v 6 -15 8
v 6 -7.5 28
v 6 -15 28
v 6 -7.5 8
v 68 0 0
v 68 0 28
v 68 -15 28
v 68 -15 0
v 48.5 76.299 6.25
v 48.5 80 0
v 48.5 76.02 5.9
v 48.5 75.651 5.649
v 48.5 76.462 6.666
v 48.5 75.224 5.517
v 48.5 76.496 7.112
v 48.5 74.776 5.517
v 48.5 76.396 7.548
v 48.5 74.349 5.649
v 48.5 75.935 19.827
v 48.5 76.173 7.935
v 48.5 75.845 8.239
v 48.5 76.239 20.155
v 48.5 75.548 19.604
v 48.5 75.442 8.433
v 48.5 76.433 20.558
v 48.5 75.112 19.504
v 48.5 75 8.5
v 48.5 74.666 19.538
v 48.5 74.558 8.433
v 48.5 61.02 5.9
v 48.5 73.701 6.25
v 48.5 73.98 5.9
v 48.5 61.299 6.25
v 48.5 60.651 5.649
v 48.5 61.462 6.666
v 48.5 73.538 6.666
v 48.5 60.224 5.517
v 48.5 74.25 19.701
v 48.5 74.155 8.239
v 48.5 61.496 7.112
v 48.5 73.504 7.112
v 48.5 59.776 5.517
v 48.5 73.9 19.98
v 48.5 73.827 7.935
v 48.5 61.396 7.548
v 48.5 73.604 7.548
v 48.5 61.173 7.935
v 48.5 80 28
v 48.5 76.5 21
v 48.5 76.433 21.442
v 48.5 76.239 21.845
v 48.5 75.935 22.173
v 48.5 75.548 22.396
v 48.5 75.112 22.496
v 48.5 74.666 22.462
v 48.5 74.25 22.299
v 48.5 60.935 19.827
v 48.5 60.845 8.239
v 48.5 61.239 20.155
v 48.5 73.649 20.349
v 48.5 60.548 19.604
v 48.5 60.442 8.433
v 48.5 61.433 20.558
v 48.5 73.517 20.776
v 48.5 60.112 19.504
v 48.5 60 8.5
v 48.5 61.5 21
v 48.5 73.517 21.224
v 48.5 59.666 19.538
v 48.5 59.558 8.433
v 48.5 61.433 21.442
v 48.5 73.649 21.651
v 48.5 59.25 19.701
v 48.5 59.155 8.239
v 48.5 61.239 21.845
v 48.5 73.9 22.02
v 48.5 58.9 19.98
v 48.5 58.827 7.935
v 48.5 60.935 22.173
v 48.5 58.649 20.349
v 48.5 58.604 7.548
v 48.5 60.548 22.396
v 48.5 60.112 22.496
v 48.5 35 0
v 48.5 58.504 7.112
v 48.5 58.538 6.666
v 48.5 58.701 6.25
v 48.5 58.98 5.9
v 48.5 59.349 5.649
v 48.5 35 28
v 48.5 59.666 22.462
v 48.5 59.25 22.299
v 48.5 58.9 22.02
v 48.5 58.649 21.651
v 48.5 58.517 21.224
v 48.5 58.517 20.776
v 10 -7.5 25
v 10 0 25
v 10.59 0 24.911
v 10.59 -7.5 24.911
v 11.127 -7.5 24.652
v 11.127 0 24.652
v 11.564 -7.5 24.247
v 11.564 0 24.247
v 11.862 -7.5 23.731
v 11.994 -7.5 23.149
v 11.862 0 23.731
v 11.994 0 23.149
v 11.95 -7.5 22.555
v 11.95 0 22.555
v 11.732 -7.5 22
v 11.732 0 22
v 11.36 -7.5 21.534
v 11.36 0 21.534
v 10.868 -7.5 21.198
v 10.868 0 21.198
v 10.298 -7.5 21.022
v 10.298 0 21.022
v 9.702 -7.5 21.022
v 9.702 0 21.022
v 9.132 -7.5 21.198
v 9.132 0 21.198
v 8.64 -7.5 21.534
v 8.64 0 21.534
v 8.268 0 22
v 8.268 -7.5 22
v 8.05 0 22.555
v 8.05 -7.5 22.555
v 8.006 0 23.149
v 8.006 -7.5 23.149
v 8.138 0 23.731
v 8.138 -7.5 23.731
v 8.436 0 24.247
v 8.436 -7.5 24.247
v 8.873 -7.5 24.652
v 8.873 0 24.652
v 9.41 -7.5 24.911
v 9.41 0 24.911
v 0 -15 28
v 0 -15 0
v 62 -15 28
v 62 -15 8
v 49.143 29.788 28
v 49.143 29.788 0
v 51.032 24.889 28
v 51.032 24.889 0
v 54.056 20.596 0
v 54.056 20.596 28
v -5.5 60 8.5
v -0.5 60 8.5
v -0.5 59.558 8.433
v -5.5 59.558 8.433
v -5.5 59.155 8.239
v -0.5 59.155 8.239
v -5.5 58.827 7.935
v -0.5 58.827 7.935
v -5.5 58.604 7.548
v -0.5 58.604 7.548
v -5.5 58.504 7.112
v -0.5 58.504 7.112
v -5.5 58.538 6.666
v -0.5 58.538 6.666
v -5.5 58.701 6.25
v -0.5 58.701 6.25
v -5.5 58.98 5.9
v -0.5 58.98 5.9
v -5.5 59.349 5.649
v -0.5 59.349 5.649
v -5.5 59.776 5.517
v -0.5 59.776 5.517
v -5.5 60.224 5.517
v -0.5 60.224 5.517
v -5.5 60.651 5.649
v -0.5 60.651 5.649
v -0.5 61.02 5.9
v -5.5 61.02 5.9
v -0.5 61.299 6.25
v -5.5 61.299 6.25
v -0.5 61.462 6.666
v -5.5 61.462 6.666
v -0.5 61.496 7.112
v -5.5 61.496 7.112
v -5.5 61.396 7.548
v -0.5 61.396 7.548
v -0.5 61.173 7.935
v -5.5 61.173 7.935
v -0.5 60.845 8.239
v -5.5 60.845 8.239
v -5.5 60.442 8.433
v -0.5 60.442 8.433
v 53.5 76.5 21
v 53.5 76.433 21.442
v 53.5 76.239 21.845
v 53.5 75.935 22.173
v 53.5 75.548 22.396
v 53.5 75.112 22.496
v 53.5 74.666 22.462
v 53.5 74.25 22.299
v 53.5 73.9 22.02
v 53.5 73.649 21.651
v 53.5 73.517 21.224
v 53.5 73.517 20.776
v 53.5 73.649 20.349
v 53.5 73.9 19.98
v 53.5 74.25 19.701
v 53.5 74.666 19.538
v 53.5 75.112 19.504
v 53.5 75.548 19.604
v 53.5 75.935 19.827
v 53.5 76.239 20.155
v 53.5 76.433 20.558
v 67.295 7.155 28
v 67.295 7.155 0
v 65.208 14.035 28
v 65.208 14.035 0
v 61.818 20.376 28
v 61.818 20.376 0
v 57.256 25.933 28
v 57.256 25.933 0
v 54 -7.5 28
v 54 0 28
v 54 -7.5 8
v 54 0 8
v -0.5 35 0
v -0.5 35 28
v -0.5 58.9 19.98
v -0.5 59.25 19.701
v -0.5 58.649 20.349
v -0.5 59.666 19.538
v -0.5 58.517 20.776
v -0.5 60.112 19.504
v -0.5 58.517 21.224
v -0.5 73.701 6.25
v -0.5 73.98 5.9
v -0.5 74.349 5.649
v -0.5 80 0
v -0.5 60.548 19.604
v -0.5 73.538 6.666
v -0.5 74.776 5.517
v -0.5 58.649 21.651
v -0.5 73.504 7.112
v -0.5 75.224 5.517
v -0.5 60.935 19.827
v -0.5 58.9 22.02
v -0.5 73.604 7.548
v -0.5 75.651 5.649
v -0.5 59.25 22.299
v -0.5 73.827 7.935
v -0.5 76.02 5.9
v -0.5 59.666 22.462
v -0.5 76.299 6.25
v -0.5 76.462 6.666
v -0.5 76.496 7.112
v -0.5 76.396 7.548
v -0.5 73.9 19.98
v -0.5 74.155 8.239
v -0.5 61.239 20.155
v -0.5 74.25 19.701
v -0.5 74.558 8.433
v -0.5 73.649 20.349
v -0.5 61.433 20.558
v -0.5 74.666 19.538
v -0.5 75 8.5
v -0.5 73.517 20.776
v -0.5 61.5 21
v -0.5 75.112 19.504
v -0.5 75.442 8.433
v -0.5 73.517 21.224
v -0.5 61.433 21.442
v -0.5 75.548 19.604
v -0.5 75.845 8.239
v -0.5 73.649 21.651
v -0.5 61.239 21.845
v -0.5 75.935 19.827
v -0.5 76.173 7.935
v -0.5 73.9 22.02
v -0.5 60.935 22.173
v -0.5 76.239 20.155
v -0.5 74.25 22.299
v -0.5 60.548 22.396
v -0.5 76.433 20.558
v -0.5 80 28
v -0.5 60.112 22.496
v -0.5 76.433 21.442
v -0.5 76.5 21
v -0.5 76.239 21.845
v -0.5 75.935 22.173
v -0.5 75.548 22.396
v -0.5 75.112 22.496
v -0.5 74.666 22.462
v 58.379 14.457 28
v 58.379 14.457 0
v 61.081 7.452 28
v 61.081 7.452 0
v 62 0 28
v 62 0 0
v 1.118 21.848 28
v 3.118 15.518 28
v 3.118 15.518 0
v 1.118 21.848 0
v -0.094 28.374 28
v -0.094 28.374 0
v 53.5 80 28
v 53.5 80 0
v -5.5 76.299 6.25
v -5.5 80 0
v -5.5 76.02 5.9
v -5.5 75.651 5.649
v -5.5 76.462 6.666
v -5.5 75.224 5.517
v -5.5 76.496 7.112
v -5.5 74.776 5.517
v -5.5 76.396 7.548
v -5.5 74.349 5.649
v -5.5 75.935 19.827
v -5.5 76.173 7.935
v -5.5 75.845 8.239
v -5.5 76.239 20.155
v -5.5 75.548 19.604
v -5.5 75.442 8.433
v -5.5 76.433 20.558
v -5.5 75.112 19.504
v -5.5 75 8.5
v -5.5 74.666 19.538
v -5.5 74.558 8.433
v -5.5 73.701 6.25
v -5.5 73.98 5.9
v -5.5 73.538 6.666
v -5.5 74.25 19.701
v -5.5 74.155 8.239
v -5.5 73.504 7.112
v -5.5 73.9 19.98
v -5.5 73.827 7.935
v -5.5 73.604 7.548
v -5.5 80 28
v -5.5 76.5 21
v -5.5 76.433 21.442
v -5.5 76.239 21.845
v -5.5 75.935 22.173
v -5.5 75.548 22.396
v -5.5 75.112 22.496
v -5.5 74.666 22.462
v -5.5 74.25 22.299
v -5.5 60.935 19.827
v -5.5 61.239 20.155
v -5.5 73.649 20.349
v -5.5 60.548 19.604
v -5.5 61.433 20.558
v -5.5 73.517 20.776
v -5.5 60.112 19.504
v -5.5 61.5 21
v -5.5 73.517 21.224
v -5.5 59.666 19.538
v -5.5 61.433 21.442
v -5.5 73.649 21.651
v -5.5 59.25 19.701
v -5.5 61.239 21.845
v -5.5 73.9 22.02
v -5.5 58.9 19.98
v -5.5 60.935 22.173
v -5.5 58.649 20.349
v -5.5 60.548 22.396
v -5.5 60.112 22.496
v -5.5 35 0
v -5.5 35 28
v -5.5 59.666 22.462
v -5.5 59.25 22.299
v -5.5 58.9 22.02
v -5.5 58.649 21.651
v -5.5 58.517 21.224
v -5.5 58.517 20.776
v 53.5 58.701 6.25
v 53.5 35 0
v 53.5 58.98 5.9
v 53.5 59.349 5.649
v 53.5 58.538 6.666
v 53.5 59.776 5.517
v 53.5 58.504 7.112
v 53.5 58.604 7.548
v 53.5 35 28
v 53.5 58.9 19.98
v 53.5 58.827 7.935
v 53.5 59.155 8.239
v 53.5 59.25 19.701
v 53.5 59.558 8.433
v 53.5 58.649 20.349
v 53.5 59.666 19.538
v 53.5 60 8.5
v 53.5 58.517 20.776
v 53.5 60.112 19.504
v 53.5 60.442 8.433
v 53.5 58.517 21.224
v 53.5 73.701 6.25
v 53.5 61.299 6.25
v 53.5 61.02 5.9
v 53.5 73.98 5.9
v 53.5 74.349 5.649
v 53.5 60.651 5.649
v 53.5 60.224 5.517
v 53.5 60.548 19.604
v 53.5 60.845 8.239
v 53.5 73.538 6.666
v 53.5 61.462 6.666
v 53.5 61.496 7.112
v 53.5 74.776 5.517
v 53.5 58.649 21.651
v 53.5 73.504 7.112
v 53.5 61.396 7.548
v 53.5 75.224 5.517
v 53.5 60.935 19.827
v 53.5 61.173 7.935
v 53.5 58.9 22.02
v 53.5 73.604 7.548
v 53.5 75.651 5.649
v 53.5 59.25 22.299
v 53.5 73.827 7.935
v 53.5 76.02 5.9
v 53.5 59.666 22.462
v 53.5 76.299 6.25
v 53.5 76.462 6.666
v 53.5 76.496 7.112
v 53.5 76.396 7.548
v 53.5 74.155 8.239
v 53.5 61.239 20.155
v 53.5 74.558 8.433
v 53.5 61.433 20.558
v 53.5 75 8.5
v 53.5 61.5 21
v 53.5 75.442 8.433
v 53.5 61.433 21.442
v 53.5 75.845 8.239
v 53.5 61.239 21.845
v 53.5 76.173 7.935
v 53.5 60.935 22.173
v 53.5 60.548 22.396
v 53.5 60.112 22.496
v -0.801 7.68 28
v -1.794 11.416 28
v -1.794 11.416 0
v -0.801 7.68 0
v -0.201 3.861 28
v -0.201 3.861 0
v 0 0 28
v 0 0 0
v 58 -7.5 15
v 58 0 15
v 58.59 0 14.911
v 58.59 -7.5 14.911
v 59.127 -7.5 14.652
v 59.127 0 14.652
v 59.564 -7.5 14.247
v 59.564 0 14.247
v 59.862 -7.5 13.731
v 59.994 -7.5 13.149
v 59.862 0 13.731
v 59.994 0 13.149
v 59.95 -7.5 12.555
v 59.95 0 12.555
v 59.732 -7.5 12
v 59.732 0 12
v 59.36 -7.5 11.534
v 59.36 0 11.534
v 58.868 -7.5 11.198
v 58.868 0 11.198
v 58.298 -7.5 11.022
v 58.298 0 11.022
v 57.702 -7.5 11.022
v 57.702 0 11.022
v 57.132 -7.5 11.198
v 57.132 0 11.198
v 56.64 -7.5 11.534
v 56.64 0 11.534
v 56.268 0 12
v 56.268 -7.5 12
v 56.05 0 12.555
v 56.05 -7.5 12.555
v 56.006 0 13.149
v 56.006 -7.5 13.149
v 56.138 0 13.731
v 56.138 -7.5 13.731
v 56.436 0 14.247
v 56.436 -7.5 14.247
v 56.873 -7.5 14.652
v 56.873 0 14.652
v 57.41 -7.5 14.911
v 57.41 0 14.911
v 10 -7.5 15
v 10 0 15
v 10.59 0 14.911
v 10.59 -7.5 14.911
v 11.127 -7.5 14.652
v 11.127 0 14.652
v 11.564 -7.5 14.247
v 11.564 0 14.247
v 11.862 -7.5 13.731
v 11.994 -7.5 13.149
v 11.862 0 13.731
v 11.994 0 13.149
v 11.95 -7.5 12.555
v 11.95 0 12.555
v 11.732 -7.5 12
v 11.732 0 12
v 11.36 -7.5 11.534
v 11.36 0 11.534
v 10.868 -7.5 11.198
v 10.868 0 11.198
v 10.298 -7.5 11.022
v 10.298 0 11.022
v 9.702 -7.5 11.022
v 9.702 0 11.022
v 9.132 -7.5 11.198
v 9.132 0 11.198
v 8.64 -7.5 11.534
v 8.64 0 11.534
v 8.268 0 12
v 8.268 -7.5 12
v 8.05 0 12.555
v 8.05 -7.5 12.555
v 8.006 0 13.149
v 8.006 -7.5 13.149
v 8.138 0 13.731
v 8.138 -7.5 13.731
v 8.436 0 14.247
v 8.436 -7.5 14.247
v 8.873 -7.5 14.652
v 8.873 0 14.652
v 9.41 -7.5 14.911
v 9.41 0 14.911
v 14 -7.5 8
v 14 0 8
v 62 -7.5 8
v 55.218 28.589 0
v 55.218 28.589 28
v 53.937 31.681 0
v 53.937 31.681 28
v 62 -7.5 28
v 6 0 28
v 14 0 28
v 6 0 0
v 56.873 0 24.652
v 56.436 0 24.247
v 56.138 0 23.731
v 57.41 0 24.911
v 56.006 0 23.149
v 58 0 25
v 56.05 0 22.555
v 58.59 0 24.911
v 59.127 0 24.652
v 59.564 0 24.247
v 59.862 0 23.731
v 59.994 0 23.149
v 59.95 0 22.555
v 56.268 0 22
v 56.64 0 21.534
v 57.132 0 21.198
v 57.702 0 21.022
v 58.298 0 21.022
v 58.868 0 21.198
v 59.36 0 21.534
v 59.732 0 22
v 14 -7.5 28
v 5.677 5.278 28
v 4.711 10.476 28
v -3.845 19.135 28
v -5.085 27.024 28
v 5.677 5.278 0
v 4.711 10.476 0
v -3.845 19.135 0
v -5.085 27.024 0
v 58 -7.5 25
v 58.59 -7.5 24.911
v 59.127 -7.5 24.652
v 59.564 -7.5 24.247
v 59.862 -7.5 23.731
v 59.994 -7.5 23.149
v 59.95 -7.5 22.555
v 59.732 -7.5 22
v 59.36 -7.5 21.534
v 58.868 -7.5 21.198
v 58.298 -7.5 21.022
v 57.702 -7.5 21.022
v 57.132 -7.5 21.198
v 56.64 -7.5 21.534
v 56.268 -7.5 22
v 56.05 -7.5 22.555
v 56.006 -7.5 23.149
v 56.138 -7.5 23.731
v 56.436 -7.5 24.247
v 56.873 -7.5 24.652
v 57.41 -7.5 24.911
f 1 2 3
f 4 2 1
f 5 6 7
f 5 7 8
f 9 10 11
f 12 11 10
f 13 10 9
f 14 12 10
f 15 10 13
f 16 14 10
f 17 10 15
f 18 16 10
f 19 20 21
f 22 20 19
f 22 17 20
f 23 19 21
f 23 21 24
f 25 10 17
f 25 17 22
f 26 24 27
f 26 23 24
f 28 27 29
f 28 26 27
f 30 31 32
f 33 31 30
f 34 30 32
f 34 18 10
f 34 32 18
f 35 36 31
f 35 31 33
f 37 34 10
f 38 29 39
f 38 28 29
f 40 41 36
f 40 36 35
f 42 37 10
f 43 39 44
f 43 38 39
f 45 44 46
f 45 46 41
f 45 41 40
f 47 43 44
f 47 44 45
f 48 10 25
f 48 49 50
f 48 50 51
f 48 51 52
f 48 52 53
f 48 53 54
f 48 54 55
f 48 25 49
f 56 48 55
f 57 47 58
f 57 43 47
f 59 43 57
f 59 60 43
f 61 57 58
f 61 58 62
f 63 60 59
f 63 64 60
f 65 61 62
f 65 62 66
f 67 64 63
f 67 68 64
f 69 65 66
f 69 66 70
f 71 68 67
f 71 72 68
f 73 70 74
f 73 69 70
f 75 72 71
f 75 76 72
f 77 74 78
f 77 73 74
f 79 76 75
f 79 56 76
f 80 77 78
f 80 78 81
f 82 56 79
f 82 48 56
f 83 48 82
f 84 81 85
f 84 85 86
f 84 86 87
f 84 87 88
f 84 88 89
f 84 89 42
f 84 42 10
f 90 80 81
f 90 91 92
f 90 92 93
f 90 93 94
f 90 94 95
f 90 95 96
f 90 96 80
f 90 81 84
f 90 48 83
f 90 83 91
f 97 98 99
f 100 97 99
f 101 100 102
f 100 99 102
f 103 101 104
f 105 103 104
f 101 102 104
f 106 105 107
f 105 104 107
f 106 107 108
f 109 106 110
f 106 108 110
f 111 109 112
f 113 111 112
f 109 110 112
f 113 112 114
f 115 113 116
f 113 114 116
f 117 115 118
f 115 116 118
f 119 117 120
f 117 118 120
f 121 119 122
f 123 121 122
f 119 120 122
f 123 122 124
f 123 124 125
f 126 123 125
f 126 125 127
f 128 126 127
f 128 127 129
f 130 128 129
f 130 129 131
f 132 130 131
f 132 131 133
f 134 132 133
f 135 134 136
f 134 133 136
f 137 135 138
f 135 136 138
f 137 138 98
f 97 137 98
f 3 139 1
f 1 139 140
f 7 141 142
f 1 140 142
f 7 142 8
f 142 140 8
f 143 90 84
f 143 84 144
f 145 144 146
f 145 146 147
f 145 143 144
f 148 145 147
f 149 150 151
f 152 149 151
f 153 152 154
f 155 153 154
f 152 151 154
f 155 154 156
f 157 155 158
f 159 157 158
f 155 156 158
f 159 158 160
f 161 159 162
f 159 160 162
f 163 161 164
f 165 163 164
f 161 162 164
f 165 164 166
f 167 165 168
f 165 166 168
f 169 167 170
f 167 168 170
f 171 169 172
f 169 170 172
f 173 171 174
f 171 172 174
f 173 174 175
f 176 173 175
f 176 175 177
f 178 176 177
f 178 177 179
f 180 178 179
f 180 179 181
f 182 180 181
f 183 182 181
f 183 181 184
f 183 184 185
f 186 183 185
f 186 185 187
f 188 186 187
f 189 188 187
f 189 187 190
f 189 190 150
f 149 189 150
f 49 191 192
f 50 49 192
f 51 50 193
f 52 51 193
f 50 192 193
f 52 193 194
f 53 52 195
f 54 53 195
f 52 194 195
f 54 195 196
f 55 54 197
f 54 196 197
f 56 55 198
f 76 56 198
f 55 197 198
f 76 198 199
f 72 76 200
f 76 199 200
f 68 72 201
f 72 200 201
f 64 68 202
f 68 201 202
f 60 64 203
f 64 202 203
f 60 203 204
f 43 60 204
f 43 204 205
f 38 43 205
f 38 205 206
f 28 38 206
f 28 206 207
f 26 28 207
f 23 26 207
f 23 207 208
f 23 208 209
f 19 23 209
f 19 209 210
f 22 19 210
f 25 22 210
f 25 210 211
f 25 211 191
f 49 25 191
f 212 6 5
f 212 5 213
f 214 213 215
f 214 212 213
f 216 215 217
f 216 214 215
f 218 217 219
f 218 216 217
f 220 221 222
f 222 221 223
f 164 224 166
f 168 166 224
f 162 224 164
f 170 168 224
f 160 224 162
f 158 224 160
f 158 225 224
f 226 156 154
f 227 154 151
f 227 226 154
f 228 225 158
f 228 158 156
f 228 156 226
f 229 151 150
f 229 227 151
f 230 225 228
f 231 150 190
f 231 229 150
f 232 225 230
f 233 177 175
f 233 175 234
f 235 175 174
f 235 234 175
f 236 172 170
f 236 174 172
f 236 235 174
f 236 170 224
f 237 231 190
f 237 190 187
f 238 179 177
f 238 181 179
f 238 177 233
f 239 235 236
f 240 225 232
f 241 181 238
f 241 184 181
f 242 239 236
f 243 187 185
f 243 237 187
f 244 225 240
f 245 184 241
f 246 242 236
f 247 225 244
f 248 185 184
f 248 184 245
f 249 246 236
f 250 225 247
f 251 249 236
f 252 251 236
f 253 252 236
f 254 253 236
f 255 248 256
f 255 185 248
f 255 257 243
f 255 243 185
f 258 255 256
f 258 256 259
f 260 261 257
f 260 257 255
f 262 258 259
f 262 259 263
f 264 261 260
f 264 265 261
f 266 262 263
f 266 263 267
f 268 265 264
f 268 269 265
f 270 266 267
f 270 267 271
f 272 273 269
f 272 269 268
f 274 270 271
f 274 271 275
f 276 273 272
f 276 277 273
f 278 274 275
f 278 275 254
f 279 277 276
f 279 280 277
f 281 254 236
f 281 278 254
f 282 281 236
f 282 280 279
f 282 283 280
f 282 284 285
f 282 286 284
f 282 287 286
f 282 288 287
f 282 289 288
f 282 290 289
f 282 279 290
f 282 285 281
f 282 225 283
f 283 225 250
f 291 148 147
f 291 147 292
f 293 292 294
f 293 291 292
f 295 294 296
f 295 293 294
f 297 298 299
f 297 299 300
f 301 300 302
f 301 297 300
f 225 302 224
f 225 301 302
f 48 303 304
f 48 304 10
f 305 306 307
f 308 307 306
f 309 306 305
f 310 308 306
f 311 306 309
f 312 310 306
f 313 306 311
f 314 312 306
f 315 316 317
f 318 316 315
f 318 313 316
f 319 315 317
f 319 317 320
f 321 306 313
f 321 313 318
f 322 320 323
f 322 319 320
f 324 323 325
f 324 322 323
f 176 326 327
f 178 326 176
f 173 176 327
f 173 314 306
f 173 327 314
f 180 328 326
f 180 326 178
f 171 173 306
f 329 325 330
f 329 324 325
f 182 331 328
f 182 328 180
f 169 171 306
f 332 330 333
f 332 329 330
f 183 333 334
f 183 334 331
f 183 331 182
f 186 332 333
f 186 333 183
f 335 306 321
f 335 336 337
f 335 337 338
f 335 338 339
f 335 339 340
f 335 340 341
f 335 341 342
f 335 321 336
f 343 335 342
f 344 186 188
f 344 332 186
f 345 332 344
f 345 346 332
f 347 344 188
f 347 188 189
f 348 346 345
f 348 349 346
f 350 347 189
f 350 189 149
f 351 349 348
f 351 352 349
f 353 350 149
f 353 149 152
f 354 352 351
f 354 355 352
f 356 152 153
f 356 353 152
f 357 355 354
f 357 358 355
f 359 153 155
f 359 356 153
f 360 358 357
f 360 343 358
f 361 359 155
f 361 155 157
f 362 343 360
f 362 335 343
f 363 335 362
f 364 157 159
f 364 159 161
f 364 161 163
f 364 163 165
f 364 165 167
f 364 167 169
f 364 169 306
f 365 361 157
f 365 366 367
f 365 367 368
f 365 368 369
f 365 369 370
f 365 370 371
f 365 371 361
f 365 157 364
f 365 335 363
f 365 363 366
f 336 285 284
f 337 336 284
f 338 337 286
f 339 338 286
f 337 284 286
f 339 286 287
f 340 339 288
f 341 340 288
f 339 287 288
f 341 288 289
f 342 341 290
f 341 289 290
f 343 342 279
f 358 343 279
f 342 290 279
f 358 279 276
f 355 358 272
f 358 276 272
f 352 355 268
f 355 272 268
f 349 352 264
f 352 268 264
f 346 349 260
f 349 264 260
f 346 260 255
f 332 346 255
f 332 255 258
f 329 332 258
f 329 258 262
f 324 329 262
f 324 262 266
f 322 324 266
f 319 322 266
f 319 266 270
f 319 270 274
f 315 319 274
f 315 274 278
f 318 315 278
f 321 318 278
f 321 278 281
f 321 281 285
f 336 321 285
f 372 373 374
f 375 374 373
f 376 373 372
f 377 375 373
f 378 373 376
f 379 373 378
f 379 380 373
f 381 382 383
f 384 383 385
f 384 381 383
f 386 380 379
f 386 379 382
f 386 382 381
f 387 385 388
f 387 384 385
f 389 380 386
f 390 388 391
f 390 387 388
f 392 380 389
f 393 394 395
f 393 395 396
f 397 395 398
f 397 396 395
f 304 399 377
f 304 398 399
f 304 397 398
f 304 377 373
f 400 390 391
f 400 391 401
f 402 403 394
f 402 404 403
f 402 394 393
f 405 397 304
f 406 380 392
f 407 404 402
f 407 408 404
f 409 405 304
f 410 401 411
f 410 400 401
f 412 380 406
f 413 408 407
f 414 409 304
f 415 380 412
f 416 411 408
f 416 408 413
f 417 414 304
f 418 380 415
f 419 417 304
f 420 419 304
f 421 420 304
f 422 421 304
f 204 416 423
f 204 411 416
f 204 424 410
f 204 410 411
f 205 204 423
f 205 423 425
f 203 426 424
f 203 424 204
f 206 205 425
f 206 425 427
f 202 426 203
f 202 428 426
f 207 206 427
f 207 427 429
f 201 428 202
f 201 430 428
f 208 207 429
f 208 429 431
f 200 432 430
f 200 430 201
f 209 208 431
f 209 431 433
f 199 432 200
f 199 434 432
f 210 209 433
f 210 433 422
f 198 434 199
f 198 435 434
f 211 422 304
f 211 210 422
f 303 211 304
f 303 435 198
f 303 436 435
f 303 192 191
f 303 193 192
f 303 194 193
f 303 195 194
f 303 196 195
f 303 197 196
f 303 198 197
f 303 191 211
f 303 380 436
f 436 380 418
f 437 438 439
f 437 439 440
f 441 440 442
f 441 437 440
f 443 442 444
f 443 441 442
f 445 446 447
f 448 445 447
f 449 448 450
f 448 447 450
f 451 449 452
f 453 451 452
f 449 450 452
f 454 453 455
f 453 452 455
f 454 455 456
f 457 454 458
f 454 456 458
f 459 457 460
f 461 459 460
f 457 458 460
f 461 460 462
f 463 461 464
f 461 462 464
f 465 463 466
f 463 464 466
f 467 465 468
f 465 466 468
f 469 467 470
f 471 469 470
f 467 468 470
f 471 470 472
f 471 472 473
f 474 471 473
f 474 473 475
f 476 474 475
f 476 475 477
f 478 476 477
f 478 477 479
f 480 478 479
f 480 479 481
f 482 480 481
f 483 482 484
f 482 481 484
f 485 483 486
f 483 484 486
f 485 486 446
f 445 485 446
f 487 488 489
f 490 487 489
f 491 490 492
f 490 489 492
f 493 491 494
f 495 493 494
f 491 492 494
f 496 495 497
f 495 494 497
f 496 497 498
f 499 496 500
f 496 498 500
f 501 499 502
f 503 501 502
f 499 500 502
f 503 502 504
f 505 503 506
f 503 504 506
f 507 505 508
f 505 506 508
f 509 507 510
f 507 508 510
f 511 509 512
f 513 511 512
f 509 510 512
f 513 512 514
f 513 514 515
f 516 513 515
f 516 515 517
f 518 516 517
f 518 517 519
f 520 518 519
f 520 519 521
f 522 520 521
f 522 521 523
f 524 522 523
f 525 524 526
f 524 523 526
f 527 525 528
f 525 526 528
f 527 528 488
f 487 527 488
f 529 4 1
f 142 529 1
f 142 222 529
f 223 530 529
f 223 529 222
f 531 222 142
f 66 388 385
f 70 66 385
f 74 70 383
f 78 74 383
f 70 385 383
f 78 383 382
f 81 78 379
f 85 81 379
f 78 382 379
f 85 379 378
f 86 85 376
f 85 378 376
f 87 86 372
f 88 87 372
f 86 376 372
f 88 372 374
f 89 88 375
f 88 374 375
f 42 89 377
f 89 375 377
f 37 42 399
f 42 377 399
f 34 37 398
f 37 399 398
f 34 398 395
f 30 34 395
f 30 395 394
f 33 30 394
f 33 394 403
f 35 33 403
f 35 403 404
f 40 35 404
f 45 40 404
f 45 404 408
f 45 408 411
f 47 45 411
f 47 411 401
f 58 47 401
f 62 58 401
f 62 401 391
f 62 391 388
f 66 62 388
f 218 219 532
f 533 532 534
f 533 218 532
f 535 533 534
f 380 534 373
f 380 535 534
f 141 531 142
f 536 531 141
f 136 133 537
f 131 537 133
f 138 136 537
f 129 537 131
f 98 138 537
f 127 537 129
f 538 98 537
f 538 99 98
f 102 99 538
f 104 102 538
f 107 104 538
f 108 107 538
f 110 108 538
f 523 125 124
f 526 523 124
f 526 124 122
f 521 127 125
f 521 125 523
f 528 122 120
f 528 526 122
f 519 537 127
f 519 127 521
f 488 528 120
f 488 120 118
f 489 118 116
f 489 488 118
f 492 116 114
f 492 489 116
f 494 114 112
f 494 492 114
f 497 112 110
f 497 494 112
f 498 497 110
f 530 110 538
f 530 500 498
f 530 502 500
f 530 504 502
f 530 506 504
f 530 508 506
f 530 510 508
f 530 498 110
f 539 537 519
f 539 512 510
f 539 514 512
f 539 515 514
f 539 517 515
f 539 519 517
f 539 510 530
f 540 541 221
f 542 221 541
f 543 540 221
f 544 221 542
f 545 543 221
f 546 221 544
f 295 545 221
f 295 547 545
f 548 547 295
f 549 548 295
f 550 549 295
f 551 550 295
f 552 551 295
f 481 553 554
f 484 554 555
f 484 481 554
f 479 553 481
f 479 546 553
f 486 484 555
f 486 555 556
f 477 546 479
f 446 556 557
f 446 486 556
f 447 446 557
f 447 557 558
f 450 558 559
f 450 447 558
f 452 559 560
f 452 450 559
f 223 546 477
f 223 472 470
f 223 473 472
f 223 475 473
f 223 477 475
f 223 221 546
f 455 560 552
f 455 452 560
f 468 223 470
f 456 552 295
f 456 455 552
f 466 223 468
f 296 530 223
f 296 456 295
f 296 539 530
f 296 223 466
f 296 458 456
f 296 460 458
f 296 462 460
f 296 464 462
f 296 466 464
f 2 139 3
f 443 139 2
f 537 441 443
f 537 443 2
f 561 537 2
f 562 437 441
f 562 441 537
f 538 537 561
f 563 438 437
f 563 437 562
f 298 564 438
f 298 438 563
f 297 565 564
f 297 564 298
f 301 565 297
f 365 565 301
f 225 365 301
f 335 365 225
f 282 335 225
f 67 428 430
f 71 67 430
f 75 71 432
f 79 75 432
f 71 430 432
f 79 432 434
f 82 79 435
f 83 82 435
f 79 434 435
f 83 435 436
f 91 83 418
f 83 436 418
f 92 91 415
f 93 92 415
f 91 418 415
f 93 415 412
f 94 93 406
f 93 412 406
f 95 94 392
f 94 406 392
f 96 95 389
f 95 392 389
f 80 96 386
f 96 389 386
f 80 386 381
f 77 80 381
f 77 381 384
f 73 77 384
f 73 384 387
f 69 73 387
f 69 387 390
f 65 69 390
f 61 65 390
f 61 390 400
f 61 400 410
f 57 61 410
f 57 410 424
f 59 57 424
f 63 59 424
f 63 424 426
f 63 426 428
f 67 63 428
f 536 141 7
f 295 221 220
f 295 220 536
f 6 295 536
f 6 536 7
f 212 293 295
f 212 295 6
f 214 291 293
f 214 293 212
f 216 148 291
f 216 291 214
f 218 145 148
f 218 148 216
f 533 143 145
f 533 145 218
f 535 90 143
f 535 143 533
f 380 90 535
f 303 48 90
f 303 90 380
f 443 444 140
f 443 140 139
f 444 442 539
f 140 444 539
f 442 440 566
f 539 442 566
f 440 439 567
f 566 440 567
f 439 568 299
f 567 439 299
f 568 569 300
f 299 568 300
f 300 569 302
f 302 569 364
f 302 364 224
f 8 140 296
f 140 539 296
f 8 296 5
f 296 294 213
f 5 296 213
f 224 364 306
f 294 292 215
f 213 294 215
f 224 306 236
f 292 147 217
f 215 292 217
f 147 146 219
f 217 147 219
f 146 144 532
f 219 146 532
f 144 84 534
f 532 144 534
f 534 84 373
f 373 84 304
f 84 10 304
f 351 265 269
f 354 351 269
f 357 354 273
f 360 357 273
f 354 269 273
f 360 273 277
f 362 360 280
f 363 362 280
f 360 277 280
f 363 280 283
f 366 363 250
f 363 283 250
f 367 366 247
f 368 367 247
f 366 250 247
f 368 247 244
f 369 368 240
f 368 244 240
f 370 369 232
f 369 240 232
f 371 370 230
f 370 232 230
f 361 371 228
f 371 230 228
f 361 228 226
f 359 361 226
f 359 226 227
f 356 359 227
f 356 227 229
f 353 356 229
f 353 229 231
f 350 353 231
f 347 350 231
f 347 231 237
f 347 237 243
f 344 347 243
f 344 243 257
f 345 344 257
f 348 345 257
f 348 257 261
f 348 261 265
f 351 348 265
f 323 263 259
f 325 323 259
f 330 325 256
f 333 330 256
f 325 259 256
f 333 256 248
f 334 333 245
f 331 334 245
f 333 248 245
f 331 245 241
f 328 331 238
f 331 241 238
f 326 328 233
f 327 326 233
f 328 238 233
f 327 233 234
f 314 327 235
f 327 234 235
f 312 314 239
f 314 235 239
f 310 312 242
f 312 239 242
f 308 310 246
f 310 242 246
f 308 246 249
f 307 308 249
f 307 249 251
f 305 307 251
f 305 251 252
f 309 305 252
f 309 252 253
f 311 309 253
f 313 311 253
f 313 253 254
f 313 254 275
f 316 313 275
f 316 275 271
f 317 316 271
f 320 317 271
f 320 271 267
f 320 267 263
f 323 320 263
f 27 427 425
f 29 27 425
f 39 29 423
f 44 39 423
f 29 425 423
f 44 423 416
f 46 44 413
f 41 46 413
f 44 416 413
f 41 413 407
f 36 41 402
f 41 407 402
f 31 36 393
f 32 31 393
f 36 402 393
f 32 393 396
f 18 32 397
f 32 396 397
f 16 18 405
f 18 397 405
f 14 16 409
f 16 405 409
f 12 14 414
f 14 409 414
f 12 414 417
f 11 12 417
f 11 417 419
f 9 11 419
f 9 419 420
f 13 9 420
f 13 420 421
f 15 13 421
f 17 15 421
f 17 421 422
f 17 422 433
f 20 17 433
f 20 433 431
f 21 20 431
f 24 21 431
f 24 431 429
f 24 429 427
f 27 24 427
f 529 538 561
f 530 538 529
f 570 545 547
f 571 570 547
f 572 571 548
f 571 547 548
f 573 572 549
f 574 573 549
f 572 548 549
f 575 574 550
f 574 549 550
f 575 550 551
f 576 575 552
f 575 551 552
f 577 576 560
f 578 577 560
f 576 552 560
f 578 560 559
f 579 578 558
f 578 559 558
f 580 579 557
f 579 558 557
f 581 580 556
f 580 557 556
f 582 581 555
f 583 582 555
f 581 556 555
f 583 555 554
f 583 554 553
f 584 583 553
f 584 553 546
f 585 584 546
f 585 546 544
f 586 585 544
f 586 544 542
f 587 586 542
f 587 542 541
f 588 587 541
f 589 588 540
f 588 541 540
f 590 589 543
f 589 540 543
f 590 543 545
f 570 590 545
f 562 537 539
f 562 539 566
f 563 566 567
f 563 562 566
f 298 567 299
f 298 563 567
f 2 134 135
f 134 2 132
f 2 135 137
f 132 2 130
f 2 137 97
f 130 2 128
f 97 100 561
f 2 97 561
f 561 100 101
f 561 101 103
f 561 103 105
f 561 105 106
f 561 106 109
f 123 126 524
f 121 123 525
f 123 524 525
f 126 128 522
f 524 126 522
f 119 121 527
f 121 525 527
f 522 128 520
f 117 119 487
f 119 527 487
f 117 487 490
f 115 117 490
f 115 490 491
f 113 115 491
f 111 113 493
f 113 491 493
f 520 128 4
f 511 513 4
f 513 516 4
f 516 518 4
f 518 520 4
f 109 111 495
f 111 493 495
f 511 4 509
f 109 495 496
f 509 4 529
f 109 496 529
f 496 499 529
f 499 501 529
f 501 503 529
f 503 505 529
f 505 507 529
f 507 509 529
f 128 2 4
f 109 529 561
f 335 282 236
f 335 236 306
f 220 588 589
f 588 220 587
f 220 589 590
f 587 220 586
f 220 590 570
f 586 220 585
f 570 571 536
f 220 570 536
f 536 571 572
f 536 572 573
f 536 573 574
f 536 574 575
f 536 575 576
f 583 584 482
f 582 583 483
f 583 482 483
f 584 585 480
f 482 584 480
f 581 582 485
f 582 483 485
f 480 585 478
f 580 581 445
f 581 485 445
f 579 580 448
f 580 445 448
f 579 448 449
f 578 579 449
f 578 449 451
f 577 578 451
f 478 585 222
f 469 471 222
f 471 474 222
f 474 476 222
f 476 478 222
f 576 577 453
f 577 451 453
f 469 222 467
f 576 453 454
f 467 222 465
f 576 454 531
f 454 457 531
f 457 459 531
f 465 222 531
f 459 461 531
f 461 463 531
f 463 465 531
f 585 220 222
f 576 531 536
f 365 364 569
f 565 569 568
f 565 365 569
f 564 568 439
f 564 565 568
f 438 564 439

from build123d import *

# Parameters (mm, degrees)
SKETCH1_W           = 8
SKETCH1_H           = 8
SKETCH1_W_2         = 40
BOSS_EXTRUDE1_DEPTH = 15
SKETCH1_5_W         = 8
SKETCH1_5_H         = 20
SKETCH1_5_R         = 2
BOSS_EXTRUDE2_DEPTH = 7.5
BOSS_EXTRUDE3_DEPTH = 28
CUT_EXTRUDE1_REACH  = 105.271
SKETCH3_R           = 1.5


with BuildPart() as part:
    # Sketch1 → Boss-Extrude1 (new body)
    with BuildSketch(Plane(origin=(0, 0, 0), x_dir=(1, 0, 0), z_dir=(0, 1, 0))):
        Polygon((6, -28), (6, -8), (6, 0), (0, 0), (0, -28), align=None)
        with Locations((10, -4)):
            Rectangle(SKETCH1_W, SKETCH1_H)
        with Locations((34, -4)):
            Rectangle(SKETCH1_W_2, SKETCH1_H)
        with Locations((58, -4)):
            Rectangle(SKETCH1_W, SKETCH1_H)
        Polygon((62, 0), (62, -8), (62, -28), (68, -28), (68, 0), align=None)
    extrude(amount=-BOSS_EXTRUDE1_DEPTH)

    # Sketch1<5> → Boss-Extrude2 (add)
    # profile 1 of 2: a face of its own
    with BuildSketch(Plane(origin=(0, 0, 0), x_dir=(1, 0, 0), z_dir=(0, 1, 0))):
        with Locations((10, -18)):
            Rectangle(SKETCH1_5_W, SKETCH1_5_H)
        with Locations(Location((10, -23, 0), (0, 0, 270))):
            Circle(SKETCH1_5_R, mode=Mode.SUBTRACT)
        with Locations(Location((10, -13, 0), (0, 0, 270))):
            Circle(SKETCH1_5_R, mode=Mode.SUBTRACT)
    # profile 2 of 2: a face of its own
    with BuildSketch(Plane(origin=(0, 0, 0), x_dir=(1, 0, 0), z_dir=(0, 1, 0))):
        with Locations((58, -18)):
            Rectangle(SKETCH1_5_W, SKETCH1_5_H)
        with Locations(Location((58, -23, 0), (0, 0, 270))):
            Circle(SKETCH1_5_R, mode=Mode.SUBTRACT)
        with Locations(Location((58, -13, 0), (0, 0, 270))):
            Circle(SKETCH1_5_R, mode=Mode.SUBTRACT)
    extrude(amount=-BOSS_EXTRUDE2_DEPTH)

    # Sketch2 → Boss-Extrude3 (add)
    with BuildSketch(Plane.XY.offset(28)):
        with BuildLine():
            Line((-0.5, 80), (-5.5, 80))
            Line((-5.5, 80), (-5.5, 35))
            ThreePointArc((-5.5, 35), (-4.567837418, 23.063317904), (-1.793950653, 11.416049609))
            ThreePointArc((-1.793950653, 11.416049609), (-0.451222721, 5.778071643), (0, 0))
            Line((0, 0), (6, 0))
            ThreePointArc((6, 0), (5.273404236, 7.891775129), (3.118046932, 15.51820883))
            ThreePointArc((3.118046932, 15.51820883), (0.412179175, 25.092547618), (-0.5, 35))
            Line((-0.5, 35), (-0.5, 80))
        make_face()
        with BuildLine():
            Line((53.5, 80), (48.5, 80))
            Line((48.5, 80), (48.5, 35))
            ThreePointArc((48.5, 35), (49.937115956, 27.280735927), (54.055895054, 20.595827638))
            ThreePointArc((54.055895054, 20.595827638), (59.945137576, 11.037401409), (62, 0))
            Line((62, 0), (68, 0))
            ThreePointArc((68, 0), (65.207771721, 14.035220845), (57.256309947, 25.933044956))
            ThreePointArc((57.256309947, 25.933044956), (54.476245108, 30.092874105), (53.5, 35))
            Line((53.5, 35), (53.5, 80))
        make_face()
    extrude(amount=-BOSS_EXTRUDE3_DEPTH)

    # Cut-Extrude1: up to this face of the body (flat: up to its plane)
    cut_extrude1_end = Plane(part.part.faces().sort_by_distance((-5.5, 57.5, 14))[0])
    # Sketch3 → Cut-Extrude1 (cut, up to the picked face)
    with BuildSketch(Plane(origin=(53.5, 0, 0), x_dir=(0, 0, -1), z_dir=(1, 0, 0)), mode=Mode.PRIVATE) as cut_extrude1_sk1:
        with Locations(Location((-21, 75, 0), (0, 0, 90))):
            Circle(SKETCH3_R)
    cut_extrude1_tool1 = split(extrude(cut_extrude1_sk1.sketch, amount=-CUT_EXTRUDE1_REACH, mode=Mode.PRIVATE), bisect_by=cut_extrude1_end, keep=Keep.BOTH, mode=Mode.PRIVATE)
    # Sketch3 → Cut-Extrude1 (cut, up to the picked face)
    with BuildSketch(Plane(origin=(53.5, 0, 0), x_dir=(0, 0, -1), z_dir=(1, 0, 0)), mode=Mode.PRIVATE) as cut_extrude1_sk2:
        with Locations(Location((-21, 60, 0), (0, 0, 90))):
            Circle(SKETCH3_R)
    cut_extrude1_tool2 = split(extrude(cut_extrude1_sk2.sketch, amount=-CUT_EXTRUDE1_REACH, mode=Mode.PRIVATE), bisect_by=cut_extrude1_end, keep=Keep.BOTH, mode=Mode.PRIVATE)
    # Sketch3 → Cut-Extrude1 (cut, up to the picked face)
    with BuildSketch(Plane(origin=(53.5, 0, 0), x_dir=(0, 0, -1), z_dir=(1, 0, 0)), mode=Mode.PRIVATE) as cut_extrude1_sk3:
        with Locations(Location((-7, 60, 0), (0, 0, 180))):
            Circle(SKETCH3_R)
    cut_extrude1_tool3 = split(extrude(cut_extrude1_sk3.sketch, amount=-CUT_EXTRUDE1_REACH, mode=Mode.PRIVATE), bisect_by=cut_extrude1_end, keep=Keep.BOTH, mode=Mode.PRIVATE)
    # Sketch3 → Cut-Extrude1 (cut, up to the picked face)
    with BuildSketch(Plane(origin=(53.5, 0, 0), x_dir=(0, 0, -1), z_dir=(1, 0, 0)), mode=Mode.PRIVATE) as cut_extrude1_sk4:
        with Locations(Location((-7, 75, 0), (0, 0, 180))):
            Circle(SKETCH3_R)
    cut_extrude1_tool4 = split(extrude(cut_extrude1_sk4.sketch, amount=-CUT_EXTRUDE1_REACH, mode=Mode.PRIVATE), bisect_by=cut_extrude1_end, keep=Keep.BOTH, mode=Mode.PRIVATE)
    add(cut_extrude1_tool1.solids().sort_by(Axis((53.5, 75, 21), (-1, 0, 0)))[0], mode=Mode.SUBTRACT)
    add(cut_extrude1_tool2.solids().sort_by(Axis((53.5, 60, 21), (-1, 0, 0)))[0], mode=Mode.SUBTRACT)
    add(cut_extrude1_tool3.solids().sort_by(Axis((53.5, 60, 7), (-1, 0, 0)))[0], mode=Mode.SUBTRACT)
    add(cut_extrude1_tool4.solids().sort_by(Axis((53.5, 75, 7), (-1, 0, 0)))[0], mode=Mode.SUBTRACT)


solid = part.part
